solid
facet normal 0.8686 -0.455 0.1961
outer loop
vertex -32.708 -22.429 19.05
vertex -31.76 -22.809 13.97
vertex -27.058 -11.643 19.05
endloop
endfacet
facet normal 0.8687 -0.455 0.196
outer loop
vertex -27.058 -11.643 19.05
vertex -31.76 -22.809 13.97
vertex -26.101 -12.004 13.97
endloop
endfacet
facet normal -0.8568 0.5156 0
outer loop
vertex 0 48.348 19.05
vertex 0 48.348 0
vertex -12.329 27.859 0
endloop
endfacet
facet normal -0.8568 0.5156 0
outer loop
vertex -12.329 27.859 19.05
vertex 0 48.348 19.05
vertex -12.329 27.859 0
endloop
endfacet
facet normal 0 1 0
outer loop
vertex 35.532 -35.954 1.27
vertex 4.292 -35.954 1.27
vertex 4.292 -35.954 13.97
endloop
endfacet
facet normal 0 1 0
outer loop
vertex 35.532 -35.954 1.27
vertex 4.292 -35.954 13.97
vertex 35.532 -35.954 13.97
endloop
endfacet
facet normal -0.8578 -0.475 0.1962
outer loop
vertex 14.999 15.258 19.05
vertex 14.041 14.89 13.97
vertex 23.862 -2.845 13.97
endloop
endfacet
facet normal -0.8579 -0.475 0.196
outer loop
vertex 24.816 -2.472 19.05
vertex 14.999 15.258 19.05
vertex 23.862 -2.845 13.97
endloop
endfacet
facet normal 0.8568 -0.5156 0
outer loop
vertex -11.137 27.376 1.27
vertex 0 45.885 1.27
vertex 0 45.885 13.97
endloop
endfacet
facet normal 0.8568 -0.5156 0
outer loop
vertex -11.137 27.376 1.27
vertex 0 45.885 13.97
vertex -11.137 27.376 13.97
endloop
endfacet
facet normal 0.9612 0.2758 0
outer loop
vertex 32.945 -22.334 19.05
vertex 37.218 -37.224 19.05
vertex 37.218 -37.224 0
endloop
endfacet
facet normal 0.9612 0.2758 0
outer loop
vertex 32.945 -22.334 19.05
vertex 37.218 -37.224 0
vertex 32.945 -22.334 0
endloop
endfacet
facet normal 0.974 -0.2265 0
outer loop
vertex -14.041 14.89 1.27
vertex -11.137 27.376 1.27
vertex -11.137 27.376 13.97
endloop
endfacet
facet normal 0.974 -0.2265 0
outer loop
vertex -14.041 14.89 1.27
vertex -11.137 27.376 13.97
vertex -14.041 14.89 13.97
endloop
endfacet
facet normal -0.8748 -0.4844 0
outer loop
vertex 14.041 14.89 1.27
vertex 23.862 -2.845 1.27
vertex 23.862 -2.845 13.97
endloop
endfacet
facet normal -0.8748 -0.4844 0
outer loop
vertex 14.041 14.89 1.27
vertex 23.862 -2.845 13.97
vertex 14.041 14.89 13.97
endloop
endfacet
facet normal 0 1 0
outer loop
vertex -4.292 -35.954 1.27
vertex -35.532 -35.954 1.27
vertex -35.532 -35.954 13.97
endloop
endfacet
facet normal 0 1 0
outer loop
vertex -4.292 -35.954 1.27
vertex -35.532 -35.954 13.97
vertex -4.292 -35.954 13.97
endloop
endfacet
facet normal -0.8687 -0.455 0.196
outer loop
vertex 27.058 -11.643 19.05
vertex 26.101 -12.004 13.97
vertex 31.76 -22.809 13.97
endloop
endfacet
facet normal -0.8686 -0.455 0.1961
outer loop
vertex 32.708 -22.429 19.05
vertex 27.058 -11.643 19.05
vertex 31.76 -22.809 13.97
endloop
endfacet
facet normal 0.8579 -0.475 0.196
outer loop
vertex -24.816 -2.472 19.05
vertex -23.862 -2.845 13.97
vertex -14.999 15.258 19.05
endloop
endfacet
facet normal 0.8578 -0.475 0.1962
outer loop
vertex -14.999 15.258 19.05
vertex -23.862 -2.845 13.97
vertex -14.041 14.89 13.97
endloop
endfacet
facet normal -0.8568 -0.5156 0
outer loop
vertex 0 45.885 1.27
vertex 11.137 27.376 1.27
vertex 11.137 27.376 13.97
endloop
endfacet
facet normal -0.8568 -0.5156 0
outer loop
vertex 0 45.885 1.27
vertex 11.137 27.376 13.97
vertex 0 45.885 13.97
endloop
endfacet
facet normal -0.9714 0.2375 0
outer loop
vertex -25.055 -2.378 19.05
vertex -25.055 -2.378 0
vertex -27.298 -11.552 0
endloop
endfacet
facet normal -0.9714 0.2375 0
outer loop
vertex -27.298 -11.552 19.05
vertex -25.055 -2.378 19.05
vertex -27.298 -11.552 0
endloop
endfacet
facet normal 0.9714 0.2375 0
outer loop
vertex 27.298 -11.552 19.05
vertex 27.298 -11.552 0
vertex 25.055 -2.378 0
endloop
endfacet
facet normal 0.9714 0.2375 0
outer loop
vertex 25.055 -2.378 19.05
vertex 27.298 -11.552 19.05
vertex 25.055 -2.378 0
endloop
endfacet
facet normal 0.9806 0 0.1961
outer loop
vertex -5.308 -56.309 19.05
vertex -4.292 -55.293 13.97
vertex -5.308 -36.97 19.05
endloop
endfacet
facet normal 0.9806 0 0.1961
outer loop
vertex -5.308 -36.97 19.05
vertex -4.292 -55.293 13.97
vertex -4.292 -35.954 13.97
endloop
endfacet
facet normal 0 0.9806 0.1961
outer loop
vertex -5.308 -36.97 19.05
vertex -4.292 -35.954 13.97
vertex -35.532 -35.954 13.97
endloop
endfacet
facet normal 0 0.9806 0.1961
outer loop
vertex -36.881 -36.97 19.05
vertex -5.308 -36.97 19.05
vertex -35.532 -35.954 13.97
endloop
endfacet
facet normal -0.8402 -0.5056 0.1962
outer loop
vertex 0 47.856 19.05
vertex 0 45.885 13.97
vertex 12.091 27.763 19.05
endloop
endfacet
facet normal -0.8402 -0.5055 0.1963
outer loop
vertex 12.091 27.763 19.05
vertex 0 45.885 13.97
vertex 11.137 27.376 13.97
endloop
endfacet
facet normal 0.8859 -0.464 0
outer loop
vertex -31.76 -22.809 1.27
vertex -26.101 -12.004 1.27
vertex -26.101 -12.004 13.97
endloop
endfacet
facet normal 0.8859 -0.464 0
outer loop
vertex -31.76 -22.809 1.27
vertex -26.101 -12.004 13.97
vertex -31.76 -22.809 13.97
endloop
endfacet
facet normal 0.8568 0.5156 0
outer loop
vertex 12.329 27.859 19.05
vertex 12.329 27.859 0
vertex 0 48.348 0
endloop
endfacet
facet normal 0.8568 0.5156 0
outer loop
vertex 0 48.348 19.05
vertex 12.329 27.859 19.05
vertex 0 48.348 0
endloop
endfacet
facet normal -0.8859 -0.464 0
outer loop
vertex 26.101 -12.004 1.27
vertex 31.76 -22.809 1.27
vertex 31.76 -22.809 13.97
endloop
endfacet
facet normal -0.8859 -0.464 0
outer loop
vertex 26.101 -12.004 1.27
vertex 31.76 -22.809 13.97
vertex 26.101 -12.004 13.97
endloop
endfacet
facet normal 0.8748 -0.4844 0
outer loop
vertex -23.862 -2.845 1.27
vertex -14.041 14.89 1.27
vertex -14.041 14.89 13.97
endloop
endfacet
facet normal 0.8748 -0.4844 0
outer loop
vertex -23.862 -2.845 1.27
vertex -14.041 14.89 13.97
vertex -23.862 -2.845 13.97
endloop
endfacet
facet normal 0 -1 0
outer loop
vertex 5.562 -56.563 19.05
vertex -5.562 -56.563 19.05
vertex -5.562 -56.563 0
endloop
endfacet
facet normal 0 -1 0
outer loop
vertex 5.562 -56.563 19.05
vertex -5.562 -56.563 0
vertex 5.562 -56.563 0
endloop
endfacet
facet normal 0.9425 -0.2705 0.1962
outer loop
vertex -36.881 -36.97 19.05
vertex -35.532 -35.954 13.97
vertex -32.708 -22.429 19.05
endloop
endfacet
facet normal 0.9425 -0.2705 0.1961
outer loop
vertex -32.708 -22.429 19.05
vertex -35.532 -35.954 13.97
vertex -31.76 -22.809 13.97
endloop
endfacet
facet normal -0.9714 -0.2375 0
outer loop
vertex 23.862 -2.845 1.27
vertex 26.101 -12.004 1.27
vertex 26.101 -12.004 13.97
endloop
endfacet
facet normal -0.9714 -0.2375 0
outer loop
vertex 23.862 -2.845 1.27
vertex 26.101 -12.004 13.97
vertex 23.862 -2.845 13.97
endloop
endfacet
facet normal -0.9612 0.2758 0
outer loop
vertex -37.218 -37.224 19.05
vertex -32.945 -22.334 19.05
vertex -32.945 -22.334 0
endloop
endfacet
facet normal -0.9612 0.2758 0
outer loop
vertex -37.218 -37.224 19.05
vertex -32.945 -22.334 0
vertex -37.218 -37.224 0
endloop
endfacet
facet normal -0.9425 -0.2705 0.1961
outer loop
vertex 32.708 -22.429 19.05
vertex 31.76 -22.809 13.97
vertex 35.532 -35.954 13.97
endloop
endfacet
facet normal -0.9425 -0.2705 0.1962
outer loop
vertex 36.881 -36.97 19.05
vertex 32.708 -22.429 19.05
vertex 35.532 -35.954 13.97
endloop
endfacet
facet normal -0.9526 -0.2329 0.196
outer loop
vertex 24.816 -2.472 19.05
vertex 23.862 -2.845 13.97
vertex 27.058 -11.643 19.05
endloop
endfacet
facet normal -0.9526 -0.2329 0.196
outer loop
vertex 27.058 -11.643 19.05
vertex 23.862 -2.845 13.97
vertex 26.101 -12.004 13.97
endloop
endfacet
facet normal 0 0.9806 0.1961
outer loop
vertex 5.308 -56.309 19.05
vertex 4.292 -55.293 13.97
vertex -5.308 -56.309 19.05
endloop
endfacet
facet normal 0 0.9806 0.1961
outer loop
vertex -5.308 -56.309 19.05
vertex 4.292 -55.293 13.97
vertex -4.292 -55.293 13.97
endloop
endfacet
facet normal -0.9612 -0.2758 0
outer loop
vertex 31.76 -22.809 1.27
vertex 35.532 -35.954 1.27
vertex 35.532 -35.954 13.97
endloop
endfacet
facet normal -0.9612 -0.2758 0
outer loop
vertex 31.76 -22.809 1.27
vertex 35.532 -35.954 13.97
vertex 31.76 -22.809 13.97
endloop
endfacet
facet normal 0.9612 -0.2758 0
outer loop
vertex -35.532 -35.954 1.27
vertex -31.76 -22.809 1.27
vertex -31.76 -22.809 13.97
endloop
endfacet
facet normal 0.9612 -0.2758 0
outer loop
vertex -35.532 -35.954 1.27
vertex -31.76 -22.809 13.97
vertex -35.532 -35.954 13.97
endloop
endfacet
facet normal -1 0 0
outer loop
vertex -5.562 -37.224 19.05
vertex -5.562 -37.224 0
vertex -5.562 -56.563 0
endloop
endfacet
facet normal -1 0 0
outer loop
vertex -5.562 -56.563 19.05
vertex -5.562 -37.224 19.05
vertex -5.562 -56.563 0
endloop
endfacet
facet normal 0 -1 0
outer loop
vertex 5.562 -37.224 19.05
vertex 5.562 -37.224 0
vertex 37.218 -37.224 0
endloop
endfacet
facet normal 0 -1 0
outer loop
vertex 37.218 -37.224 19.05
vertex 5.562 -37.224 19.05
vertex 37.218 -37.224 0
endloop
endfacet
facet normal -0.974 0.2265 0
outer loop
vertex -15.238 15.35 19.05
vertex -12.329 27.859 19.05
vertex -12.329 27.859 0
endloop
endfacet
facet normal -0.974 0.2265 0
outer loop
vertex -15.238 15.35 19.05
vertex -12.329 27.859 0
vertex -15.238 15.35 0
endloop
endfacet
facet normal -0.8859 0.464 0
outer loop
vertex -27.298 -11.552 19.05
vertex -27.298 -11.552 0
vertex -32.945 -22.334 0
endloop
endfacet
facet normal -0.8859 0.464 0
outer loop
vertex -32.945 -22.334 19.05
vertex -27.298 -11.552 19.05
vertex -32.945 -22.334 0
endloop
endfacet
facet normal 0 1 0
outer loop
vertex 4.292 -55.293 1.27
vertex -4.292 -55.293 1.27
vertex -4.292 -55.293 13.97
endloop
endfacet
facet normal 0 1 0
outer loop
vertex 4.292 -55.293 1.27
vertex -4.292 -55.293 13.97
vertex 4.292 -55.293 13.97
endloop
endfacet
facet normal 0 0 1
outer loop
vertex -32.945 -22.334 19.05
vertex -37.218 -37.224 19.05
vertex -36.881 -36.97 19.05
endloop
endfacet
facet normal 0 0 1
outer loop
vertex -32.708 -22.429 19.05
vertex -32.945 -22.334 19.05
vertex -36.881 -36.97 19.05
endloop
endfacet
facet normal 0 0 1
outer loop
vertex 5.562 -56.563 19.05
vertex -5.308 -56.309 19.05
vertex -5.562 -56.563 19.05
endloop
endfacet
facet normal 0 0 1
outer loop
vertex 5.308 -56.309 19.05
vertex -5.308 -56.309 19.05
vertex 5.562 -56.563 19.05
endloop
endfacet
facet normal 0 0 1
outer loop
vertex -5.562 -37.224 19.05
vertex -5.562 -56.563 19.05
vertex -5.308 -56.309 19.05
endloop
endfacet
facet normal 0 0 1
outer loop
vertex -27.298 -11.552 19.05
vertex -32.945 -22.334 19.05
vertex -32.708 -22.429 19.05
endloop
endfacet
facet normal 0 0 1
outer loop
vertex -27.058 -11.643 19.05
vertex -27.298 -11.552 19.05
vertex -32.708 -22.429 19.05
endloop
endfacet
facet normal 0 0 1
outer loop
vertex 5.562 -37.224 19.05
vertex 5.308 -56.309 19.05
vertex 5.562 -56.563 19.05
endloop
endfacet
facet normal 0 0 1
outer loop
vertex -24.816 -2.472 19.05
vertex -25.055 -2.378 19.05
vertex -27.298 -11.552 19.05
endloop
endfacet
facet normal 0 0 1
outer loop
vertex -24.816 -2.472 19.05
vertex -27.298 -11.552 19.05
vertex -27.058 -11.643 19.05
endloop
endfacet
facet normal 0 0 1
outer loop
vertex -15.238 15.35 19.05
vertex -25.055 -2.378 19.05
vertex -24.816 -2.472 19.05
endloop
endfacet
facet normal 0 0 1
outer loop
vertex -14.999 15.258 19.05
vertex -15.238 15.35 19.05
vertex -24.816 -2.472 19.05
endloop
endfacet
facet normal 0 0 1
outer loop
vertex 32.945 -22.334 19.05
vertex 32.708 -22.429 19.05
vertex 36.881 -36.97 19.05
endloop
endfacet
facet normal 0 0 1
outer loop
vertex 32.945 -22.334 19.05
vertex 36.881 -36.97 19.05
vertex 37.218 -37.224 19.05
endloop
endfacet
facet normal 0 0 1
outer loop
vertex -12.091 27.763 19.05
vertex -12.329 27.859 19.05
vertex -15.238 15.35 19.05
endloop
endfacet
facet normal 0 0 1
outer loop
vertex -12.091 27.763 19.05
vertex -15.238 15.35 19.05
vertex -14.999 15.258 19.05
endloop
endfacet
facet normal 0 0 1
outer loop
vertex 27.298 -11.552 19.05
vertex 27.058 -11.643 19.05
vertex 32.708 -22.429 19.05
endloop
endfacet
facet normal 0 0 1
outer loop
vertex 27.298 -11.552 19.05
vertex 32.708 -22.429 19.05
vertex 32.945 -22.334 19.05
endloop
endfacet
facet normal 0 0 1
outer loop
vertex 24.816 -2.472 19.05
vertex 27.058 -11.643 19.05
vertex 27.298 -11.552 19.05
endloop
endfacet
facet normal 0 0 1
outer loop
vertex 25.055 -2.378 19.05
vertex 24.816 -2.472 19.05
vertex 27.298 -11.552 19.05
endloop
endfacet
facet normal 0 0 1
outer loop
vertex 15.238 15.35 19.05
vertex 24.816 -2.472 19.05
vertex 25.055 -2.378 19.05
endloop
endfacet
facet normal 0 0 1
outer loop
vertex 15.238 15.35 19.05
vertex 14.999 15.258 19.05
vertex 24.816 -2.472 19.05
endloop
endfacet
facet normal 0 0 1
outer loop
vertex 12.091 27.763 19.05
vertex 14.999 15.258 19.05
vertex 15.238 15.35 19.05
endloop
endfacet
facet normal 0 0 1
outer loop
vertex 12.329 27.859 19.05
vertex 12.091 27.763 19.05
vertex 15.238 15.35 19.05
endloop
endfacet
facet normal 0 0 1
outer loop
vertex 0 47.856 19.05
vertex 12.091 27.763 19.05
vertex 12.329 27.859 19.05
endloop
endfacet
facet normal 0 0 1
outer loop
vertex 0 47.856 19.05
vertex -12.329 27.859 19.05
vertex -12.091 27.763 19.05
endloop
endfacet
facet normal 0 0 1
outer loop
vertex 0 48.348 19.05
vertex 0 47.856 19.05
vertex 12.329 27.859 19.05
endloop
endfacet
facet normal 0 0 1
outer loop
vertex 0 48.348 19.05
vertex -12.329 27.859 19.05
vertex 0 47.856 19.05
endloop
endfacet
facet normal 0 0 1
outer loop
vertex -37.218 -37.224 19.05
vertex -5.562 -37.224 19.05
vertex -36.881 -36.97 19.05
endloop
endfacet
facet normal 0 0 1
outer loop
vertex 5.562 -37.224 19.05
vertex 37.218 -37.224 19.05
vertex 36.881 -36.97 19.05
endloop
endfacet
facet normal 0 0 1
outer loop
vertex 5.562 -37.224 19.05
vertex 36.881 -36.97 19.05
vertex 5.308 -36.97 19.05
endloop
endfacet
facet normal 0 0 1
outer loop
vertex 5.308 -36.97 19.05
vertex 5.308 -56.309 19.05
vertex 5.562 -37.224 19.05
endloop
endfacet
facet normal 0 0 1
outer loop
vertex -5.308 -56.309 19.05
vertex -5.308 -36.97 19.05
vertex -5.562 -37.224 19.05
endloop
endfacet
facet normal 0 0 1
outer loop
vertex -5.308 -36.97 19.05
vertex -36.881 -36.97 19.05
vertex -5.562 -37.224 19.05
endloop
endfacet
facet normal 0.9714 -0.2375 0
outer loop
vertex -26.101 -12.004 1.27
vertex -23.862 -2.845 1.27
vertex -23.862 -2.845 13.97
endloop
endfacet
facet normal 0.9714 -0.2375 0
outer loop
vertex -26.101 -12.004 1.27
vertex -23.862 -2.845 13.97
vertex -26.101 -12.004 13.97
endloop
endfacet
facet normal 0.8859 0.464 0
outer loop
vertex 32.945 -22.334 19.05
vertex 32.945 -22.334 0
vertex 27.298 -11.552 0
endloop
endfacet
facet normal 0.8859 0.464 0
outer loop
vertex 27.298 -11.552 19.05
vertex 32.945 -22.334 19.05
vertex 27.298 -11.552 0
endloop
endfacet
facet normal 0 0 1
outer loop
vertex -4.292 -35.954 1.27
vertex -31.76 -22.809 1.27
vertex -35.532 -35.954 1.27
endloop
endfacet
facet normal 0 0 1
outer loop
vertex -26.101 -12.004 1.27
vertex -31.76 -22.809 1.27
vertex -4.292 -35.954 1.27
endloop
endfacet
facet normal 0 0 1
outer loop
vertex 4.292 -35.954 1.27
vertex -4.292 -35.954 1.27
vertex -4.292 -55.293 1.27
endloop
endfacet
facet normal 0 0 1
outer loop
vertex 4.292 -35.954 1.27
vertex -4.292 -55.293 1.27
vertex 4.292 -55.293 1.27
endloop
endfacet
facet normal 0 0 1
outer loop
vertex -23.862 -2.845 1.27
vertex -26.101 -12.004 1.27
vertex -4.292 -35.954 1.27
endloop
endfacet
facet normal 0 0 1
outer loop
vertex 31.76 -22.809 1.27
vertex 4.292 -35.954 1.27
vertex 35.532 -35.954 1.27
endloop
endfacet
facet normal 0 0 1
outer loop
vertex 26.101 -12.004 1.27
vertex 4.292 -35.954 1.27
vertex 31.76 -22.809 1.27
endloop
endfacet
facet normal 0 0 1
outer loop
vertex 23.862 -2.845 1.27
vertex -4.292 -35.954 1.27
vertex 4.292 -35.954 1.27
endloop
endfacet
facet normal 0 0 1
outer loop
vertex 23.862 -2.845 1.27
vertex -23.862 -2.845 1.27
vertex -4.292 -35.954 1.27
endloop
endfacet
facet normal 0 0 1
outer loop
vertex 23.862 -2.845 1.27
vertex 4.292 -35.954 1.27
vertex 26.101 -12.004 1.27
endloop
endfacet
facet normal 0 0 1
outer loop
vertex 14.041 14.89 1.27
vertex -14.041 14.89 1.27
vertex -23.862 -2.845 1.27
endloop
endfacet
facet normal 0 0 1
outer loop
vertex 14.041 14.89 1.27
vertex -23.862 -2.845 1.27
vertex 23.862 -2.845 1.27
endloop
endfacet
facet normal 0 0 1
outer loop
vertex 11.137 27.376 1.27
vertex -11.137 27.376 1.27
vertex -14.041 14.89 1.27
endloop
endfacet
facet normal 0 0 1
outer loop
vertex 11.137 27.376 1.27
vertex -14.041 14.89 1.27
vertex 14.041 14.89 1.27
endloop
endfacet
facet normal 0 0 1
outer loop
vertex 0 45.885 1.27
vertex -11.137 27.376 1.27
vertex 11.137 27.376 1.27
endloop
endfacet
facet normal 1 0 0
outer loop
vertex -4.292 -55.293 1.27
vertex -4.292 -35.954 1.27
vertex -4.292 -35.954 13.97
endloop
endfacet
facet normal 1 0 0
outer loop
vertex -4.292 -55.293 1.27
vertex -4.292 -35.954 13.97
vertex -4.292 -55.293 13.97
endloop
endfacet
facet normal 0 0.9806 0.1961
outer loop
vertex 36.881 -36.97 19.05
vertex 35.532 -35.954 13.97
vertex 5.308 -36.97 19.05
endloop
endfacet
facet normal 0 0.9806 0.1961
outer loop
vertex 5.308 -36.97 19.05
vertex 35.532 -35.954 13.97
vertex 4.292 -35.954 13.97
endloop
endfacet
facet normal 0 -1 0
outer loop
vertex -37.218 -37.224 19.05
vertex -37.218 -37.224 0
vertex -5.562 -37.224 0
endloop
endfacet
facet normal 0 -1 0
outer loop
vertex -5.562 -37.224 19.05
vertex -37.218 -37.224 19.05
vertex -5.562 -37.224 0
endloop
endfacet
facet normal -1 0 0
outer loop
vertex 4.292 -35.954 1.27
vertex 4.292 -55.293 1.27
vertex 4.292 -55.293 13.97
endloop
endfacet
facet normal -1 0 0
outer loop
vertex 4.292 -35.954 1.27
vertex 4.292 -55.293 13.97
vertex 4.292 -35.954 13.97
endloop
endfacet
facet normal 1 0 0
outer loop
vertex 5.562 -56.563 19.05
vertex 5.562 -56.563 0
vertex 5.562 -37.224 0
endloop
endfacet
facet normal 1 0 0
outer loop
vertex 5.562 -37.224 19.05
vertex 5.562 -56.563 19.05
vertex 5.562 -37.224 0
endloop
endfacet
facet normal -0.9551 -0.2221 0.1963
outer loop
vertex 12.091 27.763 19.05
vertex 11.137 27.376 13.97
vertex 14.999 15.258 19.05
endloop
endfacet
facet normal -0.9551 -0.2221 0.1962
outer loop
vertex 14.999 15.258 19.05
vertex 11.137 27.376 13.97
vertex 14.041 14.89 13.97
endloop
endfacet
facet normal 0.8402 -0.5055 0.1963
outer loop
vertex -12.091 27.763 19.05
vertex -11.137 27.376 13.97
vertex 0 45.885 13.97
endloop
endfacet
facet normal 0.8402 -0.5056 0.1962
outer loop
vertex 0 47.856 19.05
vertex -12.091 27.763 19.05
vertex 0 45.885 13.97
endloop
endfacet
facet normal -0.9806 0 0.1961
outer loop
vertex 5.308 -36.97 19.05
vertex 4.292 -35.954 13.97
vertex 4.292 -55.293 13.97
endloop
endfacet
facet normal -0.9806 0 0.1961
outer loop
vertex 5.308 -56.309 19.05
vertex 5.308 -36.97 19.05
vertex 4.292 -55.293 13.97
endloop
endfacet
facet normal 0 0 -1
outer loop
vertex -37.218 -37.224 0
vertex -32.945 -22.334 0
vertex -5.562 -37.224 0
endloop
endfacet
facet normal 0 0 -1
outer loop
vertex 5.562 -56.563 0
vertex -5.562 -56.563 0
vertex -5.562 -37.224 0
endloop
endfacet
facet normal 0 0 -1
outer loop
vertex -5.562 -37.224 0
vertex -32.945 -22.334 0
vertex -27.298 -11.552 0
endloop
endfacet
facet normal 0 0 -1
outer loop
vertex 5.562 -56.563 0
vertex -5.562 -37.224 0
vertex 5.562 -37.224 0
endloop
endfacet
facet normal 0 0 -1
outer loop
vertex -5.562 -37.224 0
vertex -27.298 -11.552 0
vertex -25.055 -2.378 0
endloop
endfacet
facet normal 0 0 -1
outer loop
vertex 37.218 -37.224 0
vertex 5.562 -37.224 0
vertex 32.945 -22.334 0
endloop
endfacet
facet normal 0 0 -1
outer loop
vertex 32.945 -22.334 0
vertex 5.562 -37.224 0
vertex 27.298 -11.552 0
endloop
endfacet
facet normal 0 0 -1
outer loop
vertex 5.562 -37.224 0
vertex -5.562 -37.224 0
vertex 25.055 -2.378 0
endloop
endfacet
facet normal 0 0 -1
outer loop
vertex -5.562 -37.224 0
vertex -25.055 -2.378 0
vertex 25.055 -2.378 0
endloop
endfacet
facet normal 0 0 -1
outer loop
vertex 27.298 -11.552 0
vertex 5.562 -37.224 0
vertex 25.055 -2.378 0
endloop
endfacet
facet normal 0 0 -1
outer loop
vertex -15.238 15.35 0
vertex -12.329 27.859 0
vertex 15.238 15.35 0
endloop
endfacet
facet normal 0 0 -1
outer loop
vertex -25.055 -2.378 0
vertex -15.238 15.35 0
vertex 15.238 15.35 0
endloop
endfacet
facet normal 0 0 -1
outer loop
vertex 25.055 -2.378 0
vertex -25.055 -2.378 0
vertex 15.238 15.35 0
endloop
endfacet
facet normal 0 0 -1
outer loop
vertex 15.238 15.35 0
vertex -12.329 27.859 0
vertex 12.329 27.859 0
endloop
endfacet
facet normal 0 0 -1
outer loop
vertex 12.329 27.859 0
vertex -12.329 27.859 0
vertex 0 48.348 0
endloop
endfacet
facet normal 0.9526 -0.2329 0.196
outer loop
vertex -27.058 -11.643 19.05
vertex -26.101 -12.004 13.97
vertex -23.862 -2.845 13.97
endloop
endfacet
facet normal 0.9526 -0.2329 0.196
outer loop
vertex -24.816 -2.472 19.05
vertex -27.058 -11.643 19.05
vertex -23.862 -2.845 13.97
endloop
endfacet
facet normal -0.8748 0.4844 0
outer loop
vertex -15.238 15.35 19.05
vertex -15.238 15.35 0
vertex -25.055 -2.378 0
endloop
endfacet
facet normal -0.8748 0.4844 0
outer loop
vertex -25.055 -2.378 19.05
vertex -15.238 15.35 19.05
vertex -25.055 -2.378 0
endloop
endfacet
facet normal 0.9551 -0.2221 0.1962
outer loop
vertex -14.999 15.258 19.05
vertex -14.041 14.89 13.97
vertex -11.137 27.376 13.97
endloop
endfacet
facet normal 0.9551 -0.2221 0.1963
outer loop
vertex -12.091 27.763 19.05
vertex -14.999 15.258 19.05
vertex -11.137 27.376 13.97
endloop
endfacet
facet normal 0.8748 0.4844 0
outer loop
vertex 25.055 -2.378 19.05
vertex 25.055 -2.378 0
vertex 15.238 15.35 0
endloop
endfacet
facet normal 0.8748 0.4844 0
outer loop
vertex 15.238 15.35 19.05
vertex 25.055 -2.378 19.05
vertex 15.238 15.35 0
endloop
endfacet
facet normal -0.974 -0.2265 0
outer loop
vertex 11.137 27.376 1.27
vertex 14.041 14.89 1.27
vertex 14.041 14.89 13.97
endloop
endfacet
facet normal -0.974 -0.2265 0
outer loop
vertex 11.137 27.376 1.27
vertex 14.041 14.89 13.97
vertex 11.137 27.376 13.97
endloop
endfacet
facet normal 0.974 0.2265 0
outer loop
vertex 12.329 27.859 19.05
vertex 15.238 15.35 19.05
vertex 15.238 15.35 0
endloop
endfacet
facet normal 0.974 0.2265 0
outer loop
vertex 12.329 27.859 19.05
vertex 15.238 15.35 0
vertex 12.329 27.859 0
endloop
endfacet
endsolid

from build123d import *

# Parameters (mm, degrees)
F1_DEPTH = 19.05
F2_T     = -1.27
F3_SIZE2 = 5.08
F3_SIZE  = 1.016


with BuildPart() as f1:
    # F0 (on Top) → F1 (new body)
    with BuildSketch(Plane.XY):
        Polygon((12.3290219964, 27.8594800581), (0, 48.3482889831), (-12.3290219964, 27.8594800581), (-15.2382130133, 15.3499666007), (-25.0549837339, -2.3781927895), (-27.2975303233, -11.5522462875), (-32.9452939332, -22.3343409598), (-37.2179499745, -37.2239015996), (-5.5621927604, -37.2239015996), (-5.5621927604, -56.5632171929), (0, -56.5632171929), (5.5621927604, -56.5632171929), (5.5621927604, -37.2239015996), (37.2179499745, -37.2239015996), (32.9452939332, -22.3343409598), (27.2975303233, -11.5522462875), (25.0549837339, -2.3781927895), (15.2382130133, 15.3499666007), align=None)
    extrude(amount=F1_DEPTH)

    # F2
    f2_openings = [f1.faces().sort_by_distance(p)[0] for p in [
        (0, -9.615745, 19.05),
    ]]
    offset(amount=F2_T, openings=f2_openings, kind=Kind.INTERSECTION)

    # F3
    f3_edges = [f1.edges().sort_by_distance(p)[0] for p in [
        (4.292193, -45.623559, 19.05),
        (19.912227, -35.953902, 19.05),
        (-4.292193, -45.623559, 19.05),
        (0, -55.293217, 19.05),
        (-19.912227, -35.953902, 19.05),
        (33.646255, -29.381456, 19.05),
        (28.930445, -17.406656, 19.05),
        (24.981144, -7.424546, 19.05),
        (18.951501, 6.022471, 19.05),
        (12.589404, 21.133113, 19.05),
        (5.568727, 36.630802, 19.05),
        (-5.568727, 36.630802, 19.05),
        (-12.589404, 21.133113, 19.05),
        (-18.951501, 6.022471, 19.05),
        (-24.981144, -7.424546, 19.05),
        (-28.930445, -17.406656, 19.05),
        (-33.646255, -29.381456, 19.05),
    ]]
    chamfer(f3_edges, length=F3_SIZE, length2=F3_SIZE2)


solid = f1.part
